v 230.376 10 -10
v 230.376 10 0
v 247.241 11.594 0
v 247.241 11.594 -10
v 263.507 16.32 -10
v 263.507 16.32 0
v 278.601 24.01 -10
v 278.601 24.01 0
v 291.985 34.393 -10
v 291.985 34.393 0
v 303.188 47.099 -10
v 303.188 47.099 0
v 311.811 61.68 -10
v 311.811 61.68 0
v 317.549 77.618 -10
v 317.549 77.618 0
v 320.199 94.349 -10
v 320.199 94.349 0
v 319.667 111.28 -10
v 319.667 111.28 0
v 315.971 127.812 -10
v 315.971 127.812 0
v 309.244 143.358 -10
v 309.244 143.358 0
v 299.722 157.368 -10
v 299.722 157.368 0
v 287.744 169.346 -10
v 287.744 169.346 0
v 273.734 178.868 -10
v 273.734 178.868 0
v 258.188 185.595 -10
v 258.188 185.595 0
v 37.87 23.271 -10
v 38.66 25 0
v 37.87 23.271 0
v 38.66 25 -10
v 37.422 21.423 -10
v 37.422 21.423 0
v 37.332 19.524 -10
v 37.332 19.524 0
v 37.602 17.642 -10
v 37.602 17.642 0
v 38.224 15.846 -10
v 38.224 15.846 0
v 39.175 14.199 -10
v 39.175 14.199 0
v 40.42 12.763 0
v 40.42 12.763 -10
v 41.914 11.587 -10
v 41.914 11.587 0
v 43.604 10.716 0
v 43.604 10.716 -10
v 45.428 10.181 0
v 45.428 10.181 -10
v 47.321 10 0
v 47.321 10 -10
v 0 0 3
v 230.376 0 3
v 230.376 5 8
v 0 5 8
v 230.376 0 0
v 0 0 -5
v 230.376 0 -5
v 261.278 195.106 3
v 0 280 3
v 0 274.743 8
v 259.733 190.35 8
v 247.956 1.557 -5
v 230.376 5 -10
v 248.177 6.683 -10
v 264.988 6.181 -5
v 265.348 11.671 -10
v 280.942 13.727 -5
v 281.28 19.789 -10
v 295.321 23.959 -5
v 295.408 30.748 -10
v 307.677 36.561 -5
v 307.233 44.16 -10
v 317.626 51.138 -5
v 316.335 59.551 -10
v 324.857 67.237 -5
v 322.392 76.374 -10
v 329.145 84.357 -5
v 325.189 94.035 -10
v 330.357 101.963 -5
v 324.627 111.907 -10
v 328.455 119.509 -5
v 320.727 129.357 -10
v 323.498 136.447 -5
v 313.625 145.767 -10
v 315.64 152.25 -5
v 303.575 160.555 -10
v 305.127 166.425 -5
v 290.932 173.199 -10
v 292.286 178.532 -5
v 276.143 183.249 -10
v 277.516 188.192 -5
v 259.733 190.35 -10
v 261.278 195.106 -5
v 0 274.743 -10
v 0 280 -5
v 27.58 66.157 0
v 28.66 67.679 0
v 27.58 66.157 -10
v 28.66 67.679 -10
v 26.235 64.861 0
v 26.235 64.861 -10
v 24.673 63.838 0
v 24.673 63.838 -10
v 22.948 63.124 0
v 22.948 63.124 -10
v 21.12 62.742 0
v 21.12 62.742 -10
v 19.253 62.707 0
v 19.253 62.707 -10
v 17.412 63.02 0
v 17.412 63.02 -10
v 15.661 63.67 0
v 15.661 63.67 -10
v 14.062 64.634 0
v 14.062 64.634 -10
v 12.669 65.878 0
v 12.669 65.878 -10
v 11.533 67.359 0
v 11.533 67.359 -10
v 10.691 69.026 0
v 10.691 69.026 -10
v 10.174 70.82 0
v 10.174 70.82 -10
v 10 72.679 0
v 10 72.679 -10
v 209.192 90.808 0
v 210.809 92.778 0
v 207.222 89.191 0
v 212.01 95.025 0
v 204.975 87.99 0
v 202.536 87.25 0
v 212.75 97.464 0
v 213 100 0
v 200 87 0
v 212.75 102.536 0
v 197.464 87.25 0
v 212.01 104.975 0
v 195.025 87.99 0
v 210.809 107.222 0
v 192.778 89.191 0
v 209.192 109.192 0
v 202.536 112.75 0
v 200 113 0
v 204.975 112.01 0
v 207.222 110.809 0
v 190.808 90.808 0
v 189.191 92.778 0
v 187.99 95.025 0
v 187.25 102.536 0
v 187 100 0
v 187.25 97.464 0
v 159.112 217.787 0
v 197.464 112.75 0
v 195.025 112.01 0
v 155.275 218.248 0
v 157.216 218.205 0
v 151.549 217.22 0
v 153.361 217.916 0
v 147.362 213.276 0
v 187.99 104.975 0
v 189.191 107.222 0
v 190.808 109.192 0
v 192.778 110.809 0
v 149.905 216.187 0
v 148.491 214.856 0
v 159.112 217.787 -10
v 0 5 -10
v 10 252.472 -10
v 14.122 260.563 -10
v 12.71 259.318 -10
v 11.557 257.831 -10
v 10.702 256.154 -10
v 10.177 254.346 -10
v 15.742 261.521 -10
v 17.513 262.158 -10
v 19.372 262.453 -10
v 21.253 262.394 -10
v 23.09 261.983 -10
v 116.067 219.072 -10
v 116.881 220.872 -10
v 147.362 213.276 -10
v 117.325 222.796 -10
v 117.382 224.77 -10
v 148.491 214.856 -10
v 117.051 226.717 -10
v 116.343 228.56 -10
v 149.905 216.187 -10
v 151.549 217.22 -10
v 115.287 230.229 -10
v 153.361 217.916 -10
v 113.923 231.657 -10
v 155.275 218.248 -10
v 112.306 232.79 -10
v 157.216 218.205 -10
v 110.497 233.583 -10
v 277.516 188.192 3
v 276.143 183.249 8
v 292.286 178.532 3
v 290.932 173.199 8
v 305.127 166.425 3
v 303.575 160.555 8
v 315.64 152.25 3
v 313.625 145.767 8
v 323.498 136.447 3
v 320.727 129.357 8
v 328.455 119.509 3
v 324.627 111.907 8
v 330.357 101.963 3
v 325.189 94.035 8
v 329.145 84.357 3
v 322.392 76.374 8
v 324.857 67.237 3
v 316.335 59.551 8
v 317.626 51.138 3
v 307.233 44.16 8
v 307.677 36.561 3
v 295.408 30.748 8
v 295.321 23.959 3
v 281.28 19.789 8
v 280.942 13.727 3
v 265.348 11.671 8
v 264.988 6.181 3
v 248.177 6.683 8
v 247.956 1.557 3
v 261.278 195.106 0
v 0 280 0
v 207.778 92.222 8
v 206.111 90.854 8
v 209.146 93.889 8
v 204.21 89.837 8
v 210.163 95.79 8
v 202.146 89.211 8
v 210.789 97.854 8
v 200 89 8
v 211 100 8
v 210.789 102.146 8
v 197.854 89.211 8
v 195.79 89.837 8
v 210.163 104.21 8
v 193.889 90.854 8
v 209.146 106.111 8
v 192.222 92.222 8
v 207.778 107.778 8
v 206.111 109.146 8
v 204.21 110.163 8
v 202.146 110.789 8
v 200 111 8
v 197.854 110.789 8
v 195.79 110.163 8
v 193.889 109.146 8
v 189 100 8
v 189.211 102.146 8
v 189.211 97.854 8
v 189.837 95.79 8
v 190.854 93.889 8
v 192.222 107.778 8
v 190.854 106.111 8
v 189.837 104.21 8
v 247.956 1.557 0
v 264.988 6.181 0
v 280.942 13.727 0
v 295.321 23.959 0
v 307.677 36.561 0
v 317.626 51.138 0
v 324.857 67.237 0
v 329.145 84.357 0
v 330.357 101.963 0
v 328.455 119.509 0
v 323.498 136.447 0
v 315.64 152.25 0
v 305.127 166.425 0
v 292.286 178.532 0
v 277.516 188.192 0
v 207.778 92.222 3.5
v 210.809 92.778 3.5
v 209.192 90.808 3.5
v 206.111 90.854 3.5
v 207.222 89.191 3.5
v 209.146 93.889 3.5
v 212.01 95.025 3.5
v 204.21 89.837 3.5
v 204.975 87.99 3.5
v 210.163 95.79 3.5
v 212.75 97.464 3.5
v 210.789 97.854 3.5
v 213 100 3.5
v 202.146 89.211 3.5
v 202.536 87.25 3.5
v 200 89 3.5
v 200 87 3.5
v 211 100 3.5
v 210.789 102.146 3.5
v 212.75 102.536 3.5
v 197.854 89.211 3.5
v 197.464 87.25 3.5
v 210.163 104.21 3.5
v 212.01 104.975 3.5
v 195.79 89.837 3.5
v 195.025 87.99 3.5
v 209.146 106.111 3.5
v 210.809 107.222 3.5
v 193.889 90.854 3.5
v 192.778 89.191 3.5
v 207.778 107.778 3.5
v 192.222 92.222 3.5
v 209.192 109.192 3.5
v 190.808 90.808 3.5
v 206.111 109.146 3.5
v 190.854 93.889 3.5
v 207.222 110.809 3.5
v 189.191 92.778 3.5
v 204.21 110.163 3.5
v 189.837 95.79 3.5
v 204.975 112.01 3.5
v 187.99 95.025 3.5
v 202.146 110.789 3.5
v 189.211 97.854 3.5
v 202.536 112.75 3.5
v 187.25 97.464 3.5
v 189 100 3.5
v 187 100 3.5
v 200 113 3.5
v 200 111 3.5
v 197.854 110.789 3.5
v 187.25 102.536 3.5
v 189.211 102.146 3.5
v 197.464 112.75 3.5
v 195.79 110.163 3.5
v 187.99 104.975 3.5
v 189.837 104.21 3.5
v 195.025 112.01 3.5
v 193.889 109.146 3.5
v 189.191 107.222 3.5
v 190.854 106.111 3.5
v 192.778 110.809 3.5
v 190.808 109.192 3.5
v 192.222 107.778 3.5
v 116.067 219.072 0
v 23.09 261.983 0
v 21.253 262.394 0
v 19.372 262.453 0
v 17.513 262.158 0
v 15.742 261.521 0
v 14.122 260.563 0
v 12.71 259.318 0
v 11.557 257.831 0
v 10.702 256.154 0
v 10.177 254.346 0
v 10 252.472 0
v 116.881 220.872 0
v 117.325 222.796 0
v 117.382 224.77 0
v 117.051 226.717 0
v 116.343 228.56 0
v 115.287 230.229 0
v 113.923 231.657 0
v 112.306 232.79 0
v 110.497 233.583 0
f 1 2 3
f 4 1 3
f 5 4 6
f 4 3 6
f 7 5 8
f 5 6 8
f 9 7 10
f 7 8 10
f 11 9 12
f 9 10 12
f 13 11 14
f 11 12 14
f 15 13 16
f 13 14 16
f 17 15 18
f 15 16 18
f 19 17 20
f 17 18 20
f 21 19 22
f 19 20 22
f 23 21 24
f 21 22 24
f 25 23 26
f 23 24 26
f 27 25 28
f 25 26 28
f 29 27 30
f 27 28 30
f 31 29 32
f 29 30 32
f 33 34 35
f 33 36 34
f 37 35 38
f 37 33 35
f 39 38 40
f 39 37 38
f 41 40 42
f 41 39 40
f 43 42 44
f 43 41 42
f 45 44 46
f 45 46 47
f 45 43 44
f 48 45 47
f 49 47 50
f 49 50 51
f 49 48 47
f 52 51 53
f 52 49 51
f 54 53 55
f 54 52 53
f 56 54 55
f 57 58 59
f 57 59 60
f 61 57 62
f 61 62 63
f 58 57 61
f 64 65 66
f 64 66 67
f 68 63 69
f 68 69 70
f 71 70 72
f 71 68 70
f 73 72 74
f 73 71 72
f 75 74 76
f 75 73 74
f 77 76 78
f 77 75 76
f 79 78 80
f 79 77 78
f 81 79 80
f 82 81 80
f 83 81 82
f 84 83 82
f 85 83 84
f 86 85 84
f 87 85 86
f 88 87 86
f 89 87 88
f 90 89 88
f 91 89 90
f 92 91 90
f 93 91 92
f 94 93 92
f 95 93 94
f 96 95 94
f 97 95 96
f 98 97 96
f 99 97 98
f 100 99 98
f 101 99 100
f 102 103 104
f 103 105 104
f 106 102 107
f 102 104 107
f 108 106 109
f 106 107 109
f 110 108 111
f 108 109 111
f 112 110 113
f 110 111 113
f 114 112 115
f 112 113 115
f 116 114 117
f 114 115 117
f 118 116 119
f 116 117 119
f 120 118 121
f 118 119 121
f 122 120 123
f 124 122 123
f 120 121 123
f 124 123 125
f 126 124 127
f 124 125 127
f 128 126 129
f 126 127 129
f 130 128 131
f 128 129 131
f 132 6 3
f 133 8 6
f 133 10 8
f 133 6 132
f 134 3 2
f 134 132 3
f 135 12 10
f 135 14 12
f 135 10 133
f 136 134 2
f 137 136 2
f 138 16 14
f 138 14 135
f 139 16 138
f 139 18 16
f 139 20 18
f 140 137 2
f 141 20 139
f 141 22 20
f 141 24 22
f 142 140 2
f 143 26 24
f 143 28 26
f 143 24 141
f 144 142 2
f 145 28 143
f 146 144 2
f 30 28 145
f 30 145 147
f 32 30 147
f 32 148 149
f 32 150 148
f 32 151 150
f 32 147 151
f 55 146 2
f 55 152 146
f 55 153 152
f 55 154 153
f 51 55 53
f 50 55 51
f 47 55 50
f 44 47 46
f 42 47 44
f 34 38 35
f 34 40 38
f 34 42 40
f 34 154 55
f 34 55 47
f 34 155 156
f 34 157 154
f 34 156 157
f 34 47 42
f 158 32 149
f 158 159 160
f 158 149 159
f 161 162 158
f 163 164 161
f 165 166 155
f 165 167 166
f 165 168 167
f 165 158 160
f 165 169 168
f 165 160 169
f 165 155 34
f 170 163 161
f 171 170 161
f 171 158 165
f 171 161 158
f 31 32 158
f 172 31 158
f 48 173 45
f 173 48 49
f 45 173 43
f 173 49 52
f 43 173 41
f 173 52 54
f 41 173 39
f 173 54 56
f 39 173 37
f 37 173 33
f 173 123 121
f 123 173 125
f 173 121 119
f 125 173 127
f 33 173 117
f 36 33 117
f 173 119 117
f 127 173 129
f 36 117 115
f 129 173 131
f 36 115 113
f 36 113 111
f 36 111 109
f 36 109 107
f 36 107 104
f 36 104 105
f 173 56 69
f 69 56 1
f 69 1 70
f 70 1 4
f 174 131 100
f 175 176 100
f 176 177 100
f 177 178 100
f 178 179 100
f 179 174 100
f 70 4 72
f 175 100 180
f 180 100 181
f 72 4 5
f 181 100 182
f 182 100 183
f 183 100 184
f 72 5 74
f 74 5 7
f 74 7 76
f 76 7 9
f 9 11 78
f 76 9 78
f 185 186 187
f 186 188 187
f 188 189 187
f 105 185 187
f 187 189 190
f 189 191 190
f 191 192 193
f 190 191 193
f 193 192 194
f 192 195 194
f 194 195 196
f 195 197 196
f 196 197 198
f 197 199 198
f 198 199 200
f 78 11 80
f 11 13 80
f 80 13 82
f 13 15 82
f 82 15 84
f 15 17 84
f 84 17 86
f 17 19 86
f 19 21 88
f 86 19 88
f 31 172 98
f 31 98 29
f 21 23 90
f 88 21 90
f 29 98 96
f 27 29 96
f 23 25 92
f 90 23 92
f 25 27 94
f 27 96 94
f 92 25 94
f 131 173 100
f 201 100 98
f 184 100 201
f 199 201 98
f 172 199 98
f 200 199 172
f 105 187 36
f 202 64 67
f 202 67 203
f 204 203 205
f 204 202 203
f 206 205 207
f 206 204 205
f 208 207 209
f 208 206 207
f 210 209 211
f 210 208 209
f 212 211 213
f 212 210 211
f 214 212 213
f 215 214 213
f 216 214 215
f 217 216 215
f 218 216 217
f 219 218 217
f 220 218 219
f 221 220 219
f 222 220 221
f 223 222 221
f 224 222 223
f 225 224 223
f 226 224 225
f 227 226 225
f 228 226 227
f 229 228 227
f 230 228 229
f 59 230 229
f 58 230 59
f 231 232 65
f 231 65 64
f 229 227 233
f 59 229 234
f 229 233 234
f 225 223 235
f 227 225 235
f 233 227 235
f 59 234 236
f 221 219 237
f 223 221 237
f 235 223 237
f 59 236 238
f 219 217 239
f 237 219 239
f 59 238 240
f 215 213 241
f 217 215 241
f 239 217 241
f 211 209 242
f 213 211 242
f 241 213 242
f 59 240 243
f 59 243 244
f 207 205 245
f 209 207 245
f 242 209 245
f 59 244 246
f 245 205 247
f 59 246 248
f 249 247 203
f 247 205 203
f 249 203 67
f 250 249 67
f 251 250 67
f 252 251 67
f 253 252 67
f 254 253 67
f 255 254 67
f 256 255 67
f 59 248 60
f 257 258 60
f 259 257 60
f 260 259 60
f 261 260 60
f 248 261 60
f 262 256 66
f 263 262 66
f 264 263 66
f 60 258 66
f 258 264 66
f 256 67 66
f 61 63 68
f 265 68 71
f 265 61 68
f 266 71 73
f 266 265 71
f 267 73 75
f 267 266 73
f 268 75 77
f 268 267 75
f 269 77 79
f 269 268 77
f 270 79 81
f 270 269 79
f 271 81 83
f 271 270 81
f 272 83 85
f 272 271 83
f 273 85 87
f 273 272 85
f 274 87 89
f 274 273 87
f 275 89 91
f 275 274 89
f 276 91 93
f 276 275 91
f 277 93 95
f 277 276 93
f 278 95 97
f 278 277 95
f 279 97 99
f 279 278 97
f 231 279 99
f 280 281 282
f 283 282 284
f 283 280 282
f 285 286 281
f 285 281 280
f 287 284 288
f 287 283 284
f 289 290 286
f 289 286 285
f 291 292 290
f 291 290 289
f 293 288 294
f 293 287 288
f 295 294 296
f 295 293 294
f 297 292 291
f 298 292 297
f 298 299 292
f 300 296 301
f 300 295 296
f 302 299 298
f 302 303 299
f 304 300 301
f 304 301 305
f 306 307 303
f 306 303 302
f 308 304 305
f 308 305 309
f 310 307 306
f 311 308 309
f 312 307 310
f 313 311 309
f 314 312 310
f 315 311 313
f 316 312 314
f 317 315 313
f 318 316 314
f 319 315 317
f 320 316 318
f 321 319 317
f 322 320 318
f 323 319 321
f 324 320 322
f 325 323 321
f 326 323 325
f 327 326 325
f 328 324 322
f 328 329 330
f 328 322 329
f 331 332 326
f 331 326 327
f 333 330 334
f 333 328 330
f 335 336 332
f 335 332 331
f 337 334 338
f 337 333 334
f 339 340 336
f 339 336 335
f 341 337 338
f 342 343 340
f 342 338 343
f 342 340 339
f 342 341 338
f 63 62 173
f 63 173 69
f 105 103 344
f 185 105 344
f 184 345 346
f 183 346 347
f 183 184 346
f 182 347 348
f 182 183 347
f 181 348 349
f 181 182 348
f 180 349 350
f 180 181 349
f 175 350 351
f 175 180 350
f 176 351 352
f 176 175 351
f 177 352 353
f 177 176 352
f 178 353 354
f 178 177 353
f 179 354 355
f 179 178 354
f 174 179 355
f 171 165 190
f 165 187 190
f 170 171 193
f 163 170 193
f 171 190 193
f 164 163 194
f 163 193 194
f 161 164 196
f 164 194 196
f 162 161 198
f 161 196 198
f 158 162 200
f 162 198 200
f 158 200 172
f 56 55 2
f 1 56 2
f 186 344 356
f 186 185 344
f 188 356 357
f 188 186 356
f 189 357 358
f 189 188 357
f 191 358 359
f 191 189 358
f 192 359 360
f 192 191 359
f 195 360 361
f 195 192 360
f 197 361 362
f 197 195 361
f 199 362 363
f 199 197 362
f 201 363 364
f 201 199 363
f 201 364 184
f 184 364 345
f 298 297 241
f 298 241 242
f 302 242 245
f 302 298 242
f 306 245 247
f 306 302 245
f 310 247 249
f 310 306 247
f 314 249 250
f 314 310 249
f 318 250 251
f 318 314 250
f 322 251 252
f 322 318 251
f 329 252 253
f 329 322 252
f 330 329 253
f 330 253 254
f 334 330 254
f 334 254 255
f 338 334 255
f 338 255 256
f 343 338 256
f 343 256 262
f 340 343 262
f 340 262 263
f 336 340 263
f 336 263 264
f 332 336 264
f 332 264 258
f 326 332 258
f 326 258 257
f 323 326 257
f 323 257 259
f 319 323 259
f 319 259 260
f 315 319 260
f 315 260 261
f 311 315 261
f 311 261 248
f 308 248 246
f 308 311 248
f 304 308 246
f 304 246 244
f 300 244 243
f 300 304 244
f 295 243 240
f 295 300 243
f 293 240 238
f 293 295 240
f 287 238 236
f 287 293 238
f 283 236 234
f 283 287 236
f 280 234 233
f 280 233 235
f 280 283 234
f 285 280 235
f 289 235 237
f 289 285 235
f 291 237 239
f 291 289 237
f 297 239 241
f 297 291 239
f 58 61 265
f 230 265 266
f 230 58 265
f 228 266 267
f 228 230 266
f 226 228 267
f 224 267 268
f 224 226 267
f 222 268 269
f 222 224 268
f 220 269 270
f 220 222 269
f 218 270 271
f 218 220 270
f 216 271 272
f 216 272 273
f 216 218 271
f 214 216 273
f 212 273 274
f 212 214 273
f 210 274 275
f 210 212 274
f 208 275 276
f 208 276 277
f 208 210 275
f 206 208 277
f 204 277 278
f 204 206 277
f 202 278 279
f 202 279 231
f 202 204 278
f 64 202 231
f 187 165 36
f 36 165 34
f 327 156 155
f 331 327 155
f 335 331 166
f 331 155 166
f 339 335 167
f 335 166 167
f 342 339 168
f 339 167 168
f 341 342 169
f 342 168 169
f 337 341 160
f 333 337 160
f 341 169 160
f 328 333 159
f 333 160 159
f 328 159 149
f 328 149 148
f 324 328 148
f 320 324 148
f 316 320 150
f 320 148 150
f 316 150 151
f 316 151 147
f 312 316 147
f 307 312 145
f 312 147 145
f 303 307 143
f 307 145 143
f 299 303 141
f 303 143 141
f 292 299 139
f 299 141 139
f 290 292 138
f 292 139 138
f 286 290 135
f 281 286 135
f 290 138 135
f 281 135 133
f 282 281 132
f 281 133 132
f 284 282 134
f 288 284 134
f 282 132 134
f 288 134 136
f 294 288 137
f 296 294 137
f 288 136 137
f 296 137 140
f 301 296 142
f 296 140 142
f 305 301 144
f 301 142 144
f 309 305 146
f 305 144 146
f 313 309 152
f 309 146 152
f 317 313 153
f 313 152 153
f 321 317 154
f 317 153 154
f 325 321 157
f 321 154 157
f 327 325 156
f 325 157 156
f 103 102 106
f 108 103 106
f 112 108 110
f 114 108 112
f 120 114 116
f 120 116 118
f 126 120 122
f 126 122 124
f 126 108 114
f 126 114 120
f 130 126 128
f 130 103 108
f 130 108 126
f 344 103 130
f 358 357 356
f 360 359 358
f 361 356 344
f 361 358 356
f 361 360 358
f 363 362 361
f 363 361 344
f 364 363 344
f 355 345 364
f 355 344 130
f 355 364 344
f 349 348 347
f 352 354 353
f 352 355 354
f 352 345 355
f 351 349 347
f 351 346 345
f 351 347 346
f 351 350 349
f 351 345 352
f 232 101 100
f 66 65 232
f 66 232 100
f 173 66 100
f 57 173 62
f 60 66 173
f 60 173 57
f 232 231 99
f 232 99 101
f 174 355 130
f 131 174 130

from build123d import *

# Parameters (mm, degrees)
SKETCH_1_R          = 11
EXTRUDE_1_DEPTH     = 8
FILLET_1_R          = 100
EXTRUDE_2_DEPTH     = 10
FILLET_2_R          = 10
CHAMFER_1_SIZE      = 5
SKETCH_4_R          = 13
CUT_EXTRUDE_1_DEPTH = 3.5


with BuildPart() as part:
    # 草图1 → 凸台-拉伸1 (new body)
    with BuildSketch(Plane.XY):
        Polygon((0, 0), (0, 280), (861.751390409, 0), align=None)
        with Locations((200, 100)):
            Circle(SKETCH_1_R, mode=Mode.SUBTRACT)
    extrude(amount=EXTRUDE_1_DEPTH)

    # 圆角1
    fillet_1_edges = [part.edges().sort_by_distance(p)[0] for p in [
        (861.751390409, 0, 4),
    ]]
    fillet(fillet_1_edges, radius=FILLET_1_R)

    # 草图2 → 凸台-拉伸2 (add)
    with BuildSketch(Plane.XY):
        with BuildLine():
            Line((0, 280), (0, 0))
            Line((0, 0), (230.376238942, 0))
            ThreePointArc((230.376238942, 0), (329.145073001, 84.356553496), (261.277938379, 195.10565163))
            Line((261.277938379, 195.10565163), (0, 280))
        make_face()
        with BuildLine():
            Line((230.376238942, 10), (30, 10))
            Line((30, 10), (151.410485182, 220.289128906))
            Line((151.410485182, 220.289128906), (258.187768435, 185.595086467))
            ThreePointArc((258.187768435, 185.595086467), (319.268189595, 85.920898146), (230.376238942, 10))
        make_face(mode=Mode.SUBTRACT)
        Polygon((10, 35.358983849), (10, 266.236180795), (122.241374643, 229.766747442), align=None, mode=Mode.SUBTRACT)
    extrude(amount=-EXTRUDE_2_DEPTH)

    # 圆角2
    fillet_2_edges = [part.edges().sort_by_distance(p)[0] for p in [
        (10, 35.358983849, -5),
        (30, 10, -5),
        (122.241374643, 229.766747442, -5),
        (151.410485182, 220.289128906, -5),
        (10, 266.236180795, -5),
    ]]
    fillet(fillet_2_edges, radius=FILLET_2_R)

    # 倒角1
    chamfer_1_edges = [part.edges().sort_by_distance(p)[0] for p in [
        (115.188119471, 0, 8),
        (130.63896919, 237.552825815, 8),
        (329.145073001, 84.356553496, 8),
        (130.63896919, 237.552825815, -10),
        (115.188119471, 0, -10),
        (329.145073001, 84.356553496, -10),
    ]]
    chamfer(chamfer_1_edges, length=CHAMFER_1_SIZE)

    # 草图4 → 切除-拉伸1 (cut)
    with BuildSketch(Plane(origin=(0, 0, 0), x_dir=(-1, 0, 0), z_dir=(0, 0, -1))):
        with Locations((-200, 100)):
            Circle(SKETCH_4_R)
    extrude(amount=-CUT_EXTRUDE_1_DEPTH, mode=Mode.SUBTRACT)


solid = part.part
